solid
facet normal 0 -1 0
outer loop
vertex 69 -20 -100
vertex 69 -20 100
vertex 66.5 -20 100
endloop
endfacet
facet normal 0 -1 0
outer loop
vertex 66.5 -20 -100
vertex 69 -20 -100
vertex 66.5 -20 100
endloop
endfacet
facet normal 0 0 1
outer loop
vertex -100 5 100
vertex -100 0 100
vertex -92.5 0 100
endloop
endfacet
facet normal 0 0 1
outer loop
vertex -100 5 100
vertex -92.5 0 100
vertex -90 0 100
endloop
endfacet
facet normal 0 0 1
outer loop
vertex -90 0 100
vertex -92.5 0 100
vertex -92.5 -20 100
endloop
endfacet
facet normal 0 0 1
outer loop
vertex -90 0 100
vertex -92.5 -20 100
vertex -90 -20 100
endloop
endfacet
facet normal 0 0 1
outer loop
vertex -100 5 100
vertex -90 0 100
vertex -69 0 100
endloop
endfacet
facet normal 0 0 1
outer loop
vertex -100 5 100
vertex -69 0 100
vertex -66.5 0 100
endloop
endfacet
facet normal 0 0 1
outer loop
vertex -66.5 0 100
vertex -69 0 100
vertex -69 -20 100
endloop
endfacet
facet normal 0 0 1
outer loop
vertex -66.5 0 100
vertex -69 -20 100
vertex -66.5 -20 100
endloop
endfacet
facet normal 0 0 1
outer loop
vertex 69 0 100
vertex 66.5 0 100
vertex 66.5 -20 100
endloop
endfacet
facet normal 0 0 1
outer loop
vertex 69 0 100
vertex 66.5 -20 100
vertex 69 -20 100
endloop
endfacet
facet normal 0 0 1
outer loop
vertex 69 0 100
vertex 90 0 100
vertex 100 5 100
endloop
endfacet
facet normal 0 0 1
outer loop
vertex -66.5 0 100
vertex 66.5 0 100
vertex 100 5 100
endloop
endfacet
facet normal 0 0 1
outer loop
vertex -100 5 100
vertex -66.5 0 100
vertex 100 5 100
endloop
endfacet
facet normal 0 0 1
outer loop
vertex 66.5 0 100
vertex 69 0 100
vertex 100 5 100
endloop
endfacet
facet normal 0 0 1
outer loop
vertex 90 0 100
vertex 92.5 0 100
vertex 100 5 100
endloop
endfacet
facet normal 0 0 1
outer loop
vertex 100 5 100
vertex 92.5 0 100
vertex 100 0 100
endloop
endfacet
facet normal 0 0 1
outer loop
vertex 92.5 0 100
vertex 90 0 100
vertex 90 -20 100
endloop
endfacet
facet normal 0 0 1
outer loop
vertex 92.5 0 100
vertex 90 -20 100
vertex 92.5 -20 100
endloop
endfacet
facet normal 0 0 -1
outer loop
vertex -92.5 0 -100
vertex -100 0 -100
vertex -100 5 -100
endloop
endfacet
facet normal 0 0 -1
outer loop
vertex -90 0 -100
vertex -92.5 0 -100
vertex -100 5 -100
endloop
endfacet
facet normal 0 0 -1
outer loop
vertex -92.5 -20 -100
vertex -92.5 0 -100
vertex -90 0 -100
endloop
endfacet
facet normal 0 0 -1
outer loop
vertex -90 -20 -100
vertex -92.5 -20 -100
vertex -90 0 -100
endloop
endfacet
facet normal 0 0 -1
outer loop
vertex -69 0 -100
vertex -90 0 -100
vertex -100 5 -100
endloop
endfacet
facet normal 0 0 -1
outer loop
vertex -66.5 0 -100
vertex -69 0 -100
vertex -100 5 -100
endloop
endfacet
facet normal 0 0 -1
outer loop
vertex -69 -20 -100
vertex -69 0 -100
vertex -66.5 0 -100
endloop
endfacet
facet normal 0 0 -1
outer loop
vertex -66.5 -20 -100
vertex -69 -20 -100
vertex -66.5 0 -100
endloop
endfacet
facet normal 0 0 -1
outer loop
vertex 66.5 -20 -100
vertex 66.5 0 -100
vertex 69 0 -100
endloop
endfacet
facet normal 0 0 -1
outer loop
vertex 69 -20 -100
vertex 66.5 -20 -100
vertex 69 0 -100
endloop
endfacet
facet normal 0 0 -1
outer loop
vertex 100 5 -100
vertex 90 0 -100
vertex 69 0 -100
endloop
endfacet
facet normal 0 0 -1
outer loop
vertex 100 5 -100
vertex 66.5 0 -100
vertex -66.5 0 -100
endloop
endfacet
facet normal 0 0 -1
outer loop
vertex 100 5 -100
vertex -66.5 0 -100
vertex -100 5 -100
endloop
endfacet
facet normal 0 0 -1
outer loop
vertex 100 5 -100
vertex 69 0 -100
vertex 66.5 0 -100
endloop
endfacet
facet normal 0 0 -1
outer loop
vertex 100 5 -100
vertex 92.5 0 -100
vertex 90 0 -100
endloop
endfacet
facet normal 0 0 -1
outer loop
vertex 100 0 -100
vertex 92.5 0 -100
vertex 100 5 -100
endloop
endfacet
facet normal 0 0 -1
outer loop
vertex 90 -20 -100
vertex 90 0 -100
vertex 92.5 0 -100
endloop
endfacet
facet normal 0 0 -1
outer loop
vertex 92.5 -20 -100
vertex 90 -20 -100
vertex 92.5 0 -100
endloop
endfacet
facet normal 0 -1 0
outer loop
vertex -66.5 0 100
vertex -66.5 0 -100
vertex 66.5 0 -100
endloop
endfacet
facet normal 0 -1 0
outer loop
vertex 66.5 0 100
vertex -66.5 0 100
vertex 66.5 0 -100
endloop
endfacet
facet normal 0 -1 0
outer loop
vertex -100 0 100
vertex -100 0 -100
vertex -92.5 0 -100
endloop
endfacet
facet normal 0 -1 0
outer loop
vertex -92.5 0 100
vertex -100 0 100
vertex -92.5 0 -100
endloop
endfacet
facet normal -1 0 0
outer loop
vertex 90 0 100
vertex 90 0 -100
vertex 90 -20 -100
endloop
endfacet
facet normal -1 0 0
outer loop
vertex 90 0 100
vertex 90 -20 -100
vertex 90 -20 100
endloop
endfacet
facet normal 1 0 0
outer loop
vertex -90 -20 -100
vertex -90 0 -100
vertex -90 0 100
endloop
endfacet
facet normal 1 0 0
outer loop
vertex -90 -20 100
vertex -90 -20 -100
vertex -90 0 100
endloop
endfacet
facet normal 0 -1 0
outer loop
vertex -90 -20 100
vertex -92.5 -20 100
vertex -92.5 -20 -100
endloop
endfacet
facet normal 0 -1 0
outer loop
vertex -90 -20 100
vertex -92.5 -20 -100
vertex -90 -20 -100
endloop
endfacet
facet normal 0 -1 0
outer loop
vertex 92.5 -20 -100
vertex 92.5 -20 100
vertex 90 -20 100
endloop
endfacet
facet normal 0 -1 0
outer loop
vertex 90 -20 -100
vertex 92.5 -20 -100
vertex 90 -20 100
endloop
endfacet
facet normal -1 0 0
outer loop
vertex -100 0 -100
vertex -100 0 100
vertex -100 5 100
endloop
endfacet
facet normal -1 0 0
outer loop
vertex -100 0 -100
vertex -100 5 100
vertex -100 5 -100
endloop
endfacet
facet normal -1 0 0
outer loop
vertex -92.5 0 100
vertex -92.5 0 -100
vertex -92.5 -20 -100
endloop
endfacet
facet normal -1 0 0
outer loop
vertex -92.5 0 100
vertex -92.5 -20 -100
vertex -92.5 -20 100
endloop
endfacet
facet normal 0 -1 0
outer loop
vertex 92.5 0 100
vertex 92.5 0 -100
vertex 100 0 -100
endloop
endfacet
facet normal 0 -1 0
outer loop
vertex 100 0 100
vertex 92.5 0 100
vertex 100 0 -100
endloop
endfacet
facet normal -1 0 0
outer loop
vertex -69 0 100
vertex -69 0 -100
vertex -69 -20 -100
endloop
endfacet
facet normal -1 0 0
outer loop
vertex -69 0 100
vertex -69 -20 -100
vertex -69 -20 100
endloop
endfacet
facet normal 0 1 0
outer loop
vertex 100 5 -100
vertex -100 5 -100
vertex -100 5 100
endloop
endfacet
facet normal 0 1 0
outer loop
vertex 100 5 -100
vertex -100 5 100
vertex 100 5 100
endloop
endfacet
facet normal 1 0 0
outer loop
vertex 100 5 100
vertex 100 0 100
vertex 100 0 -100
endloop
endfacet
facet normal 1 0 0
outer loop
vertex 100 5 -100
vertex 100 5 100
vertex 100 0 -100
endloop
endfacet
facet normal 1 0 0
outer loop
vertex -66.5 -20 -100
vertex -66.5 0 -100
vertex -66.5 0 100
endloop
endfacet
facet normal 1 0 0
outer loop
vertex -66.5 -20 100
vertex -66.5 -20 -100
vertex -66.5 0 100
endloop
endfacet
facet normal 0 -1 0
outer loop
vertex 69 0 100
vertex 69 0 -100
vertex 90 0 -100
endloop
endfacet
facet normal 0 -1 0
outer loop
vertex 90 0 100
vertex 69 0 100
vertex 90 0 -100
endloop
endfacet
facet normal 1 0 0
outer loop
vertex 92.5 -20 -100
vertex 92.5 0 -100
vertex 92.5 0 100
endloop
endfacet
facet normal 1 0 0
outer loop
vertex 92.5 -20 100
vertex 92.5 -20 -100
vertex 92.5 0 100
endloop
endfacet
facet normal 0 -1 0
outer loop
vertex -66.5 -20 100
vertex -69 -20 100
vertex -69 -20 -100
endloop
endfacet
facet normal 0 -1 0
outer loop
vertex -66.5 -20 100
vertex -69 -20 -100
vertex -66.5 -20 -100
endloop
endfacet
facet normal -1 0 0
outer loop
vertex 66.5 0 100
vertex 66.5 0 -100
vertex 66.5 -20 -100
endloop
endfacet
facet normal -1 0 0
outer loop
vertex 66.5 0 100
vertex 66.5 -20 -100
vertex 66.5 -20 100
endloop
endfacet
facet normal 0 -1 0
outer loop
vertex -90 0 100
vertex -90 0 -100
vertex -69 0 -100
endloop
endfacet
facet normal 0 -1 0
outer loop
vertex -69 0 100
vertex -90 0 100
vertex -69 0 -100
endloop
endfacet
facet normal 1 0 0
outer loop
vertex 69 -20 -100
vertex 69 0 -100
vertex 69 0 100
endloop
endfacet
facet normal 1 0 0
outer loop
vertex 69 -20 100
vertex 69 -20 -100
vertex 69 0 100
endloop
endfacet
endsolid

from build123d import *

# Parameters (mm, degrees)
SKETCH_1_W      = 200
SKETCH_1_H      = 200
EXTRUDE_1_DEPTH = 5
SKETCH_2_W      = 2.5
SKETCH_2_H      = 200
EXTRUDE_2_DEPTH = 20


with BuildPart() as part:
    # 草图1 → 凸台-拉伸1 (new body)
    with BuildSketch(Plane(origin=(0, 0, 0), x_dir=(1, 0, 0), z_dir=(0, 1, 0))):
        Rectangle(SKETCH_1_W, SKETCH_1_H)
    extrude(amount=EXTRUDE_1_DEPTH)

    # 草图2 → 凸台-拉伸2 (add)
    with BuildSketch(Plane.XZ):
        with Locations((-67.75, 0)):
            Rectangle(SKETCH_2_W, SKETCH_2_H)
        with Locations((-91.25, 0)):
            Rectangle(SKETCH_2_W, SKETCH_2_H)
    extrude_2 = extrude(amount=EXTRUDE_2_DEPTH)

    # 镜向1: 凸台-拉伸2 across plane
    add(extrude_2.mirror(Plane(origin=(0, 0, 0), x_dir=(0, 0, 1), z_dir=(1, 0, 0))))


solid = part.part
